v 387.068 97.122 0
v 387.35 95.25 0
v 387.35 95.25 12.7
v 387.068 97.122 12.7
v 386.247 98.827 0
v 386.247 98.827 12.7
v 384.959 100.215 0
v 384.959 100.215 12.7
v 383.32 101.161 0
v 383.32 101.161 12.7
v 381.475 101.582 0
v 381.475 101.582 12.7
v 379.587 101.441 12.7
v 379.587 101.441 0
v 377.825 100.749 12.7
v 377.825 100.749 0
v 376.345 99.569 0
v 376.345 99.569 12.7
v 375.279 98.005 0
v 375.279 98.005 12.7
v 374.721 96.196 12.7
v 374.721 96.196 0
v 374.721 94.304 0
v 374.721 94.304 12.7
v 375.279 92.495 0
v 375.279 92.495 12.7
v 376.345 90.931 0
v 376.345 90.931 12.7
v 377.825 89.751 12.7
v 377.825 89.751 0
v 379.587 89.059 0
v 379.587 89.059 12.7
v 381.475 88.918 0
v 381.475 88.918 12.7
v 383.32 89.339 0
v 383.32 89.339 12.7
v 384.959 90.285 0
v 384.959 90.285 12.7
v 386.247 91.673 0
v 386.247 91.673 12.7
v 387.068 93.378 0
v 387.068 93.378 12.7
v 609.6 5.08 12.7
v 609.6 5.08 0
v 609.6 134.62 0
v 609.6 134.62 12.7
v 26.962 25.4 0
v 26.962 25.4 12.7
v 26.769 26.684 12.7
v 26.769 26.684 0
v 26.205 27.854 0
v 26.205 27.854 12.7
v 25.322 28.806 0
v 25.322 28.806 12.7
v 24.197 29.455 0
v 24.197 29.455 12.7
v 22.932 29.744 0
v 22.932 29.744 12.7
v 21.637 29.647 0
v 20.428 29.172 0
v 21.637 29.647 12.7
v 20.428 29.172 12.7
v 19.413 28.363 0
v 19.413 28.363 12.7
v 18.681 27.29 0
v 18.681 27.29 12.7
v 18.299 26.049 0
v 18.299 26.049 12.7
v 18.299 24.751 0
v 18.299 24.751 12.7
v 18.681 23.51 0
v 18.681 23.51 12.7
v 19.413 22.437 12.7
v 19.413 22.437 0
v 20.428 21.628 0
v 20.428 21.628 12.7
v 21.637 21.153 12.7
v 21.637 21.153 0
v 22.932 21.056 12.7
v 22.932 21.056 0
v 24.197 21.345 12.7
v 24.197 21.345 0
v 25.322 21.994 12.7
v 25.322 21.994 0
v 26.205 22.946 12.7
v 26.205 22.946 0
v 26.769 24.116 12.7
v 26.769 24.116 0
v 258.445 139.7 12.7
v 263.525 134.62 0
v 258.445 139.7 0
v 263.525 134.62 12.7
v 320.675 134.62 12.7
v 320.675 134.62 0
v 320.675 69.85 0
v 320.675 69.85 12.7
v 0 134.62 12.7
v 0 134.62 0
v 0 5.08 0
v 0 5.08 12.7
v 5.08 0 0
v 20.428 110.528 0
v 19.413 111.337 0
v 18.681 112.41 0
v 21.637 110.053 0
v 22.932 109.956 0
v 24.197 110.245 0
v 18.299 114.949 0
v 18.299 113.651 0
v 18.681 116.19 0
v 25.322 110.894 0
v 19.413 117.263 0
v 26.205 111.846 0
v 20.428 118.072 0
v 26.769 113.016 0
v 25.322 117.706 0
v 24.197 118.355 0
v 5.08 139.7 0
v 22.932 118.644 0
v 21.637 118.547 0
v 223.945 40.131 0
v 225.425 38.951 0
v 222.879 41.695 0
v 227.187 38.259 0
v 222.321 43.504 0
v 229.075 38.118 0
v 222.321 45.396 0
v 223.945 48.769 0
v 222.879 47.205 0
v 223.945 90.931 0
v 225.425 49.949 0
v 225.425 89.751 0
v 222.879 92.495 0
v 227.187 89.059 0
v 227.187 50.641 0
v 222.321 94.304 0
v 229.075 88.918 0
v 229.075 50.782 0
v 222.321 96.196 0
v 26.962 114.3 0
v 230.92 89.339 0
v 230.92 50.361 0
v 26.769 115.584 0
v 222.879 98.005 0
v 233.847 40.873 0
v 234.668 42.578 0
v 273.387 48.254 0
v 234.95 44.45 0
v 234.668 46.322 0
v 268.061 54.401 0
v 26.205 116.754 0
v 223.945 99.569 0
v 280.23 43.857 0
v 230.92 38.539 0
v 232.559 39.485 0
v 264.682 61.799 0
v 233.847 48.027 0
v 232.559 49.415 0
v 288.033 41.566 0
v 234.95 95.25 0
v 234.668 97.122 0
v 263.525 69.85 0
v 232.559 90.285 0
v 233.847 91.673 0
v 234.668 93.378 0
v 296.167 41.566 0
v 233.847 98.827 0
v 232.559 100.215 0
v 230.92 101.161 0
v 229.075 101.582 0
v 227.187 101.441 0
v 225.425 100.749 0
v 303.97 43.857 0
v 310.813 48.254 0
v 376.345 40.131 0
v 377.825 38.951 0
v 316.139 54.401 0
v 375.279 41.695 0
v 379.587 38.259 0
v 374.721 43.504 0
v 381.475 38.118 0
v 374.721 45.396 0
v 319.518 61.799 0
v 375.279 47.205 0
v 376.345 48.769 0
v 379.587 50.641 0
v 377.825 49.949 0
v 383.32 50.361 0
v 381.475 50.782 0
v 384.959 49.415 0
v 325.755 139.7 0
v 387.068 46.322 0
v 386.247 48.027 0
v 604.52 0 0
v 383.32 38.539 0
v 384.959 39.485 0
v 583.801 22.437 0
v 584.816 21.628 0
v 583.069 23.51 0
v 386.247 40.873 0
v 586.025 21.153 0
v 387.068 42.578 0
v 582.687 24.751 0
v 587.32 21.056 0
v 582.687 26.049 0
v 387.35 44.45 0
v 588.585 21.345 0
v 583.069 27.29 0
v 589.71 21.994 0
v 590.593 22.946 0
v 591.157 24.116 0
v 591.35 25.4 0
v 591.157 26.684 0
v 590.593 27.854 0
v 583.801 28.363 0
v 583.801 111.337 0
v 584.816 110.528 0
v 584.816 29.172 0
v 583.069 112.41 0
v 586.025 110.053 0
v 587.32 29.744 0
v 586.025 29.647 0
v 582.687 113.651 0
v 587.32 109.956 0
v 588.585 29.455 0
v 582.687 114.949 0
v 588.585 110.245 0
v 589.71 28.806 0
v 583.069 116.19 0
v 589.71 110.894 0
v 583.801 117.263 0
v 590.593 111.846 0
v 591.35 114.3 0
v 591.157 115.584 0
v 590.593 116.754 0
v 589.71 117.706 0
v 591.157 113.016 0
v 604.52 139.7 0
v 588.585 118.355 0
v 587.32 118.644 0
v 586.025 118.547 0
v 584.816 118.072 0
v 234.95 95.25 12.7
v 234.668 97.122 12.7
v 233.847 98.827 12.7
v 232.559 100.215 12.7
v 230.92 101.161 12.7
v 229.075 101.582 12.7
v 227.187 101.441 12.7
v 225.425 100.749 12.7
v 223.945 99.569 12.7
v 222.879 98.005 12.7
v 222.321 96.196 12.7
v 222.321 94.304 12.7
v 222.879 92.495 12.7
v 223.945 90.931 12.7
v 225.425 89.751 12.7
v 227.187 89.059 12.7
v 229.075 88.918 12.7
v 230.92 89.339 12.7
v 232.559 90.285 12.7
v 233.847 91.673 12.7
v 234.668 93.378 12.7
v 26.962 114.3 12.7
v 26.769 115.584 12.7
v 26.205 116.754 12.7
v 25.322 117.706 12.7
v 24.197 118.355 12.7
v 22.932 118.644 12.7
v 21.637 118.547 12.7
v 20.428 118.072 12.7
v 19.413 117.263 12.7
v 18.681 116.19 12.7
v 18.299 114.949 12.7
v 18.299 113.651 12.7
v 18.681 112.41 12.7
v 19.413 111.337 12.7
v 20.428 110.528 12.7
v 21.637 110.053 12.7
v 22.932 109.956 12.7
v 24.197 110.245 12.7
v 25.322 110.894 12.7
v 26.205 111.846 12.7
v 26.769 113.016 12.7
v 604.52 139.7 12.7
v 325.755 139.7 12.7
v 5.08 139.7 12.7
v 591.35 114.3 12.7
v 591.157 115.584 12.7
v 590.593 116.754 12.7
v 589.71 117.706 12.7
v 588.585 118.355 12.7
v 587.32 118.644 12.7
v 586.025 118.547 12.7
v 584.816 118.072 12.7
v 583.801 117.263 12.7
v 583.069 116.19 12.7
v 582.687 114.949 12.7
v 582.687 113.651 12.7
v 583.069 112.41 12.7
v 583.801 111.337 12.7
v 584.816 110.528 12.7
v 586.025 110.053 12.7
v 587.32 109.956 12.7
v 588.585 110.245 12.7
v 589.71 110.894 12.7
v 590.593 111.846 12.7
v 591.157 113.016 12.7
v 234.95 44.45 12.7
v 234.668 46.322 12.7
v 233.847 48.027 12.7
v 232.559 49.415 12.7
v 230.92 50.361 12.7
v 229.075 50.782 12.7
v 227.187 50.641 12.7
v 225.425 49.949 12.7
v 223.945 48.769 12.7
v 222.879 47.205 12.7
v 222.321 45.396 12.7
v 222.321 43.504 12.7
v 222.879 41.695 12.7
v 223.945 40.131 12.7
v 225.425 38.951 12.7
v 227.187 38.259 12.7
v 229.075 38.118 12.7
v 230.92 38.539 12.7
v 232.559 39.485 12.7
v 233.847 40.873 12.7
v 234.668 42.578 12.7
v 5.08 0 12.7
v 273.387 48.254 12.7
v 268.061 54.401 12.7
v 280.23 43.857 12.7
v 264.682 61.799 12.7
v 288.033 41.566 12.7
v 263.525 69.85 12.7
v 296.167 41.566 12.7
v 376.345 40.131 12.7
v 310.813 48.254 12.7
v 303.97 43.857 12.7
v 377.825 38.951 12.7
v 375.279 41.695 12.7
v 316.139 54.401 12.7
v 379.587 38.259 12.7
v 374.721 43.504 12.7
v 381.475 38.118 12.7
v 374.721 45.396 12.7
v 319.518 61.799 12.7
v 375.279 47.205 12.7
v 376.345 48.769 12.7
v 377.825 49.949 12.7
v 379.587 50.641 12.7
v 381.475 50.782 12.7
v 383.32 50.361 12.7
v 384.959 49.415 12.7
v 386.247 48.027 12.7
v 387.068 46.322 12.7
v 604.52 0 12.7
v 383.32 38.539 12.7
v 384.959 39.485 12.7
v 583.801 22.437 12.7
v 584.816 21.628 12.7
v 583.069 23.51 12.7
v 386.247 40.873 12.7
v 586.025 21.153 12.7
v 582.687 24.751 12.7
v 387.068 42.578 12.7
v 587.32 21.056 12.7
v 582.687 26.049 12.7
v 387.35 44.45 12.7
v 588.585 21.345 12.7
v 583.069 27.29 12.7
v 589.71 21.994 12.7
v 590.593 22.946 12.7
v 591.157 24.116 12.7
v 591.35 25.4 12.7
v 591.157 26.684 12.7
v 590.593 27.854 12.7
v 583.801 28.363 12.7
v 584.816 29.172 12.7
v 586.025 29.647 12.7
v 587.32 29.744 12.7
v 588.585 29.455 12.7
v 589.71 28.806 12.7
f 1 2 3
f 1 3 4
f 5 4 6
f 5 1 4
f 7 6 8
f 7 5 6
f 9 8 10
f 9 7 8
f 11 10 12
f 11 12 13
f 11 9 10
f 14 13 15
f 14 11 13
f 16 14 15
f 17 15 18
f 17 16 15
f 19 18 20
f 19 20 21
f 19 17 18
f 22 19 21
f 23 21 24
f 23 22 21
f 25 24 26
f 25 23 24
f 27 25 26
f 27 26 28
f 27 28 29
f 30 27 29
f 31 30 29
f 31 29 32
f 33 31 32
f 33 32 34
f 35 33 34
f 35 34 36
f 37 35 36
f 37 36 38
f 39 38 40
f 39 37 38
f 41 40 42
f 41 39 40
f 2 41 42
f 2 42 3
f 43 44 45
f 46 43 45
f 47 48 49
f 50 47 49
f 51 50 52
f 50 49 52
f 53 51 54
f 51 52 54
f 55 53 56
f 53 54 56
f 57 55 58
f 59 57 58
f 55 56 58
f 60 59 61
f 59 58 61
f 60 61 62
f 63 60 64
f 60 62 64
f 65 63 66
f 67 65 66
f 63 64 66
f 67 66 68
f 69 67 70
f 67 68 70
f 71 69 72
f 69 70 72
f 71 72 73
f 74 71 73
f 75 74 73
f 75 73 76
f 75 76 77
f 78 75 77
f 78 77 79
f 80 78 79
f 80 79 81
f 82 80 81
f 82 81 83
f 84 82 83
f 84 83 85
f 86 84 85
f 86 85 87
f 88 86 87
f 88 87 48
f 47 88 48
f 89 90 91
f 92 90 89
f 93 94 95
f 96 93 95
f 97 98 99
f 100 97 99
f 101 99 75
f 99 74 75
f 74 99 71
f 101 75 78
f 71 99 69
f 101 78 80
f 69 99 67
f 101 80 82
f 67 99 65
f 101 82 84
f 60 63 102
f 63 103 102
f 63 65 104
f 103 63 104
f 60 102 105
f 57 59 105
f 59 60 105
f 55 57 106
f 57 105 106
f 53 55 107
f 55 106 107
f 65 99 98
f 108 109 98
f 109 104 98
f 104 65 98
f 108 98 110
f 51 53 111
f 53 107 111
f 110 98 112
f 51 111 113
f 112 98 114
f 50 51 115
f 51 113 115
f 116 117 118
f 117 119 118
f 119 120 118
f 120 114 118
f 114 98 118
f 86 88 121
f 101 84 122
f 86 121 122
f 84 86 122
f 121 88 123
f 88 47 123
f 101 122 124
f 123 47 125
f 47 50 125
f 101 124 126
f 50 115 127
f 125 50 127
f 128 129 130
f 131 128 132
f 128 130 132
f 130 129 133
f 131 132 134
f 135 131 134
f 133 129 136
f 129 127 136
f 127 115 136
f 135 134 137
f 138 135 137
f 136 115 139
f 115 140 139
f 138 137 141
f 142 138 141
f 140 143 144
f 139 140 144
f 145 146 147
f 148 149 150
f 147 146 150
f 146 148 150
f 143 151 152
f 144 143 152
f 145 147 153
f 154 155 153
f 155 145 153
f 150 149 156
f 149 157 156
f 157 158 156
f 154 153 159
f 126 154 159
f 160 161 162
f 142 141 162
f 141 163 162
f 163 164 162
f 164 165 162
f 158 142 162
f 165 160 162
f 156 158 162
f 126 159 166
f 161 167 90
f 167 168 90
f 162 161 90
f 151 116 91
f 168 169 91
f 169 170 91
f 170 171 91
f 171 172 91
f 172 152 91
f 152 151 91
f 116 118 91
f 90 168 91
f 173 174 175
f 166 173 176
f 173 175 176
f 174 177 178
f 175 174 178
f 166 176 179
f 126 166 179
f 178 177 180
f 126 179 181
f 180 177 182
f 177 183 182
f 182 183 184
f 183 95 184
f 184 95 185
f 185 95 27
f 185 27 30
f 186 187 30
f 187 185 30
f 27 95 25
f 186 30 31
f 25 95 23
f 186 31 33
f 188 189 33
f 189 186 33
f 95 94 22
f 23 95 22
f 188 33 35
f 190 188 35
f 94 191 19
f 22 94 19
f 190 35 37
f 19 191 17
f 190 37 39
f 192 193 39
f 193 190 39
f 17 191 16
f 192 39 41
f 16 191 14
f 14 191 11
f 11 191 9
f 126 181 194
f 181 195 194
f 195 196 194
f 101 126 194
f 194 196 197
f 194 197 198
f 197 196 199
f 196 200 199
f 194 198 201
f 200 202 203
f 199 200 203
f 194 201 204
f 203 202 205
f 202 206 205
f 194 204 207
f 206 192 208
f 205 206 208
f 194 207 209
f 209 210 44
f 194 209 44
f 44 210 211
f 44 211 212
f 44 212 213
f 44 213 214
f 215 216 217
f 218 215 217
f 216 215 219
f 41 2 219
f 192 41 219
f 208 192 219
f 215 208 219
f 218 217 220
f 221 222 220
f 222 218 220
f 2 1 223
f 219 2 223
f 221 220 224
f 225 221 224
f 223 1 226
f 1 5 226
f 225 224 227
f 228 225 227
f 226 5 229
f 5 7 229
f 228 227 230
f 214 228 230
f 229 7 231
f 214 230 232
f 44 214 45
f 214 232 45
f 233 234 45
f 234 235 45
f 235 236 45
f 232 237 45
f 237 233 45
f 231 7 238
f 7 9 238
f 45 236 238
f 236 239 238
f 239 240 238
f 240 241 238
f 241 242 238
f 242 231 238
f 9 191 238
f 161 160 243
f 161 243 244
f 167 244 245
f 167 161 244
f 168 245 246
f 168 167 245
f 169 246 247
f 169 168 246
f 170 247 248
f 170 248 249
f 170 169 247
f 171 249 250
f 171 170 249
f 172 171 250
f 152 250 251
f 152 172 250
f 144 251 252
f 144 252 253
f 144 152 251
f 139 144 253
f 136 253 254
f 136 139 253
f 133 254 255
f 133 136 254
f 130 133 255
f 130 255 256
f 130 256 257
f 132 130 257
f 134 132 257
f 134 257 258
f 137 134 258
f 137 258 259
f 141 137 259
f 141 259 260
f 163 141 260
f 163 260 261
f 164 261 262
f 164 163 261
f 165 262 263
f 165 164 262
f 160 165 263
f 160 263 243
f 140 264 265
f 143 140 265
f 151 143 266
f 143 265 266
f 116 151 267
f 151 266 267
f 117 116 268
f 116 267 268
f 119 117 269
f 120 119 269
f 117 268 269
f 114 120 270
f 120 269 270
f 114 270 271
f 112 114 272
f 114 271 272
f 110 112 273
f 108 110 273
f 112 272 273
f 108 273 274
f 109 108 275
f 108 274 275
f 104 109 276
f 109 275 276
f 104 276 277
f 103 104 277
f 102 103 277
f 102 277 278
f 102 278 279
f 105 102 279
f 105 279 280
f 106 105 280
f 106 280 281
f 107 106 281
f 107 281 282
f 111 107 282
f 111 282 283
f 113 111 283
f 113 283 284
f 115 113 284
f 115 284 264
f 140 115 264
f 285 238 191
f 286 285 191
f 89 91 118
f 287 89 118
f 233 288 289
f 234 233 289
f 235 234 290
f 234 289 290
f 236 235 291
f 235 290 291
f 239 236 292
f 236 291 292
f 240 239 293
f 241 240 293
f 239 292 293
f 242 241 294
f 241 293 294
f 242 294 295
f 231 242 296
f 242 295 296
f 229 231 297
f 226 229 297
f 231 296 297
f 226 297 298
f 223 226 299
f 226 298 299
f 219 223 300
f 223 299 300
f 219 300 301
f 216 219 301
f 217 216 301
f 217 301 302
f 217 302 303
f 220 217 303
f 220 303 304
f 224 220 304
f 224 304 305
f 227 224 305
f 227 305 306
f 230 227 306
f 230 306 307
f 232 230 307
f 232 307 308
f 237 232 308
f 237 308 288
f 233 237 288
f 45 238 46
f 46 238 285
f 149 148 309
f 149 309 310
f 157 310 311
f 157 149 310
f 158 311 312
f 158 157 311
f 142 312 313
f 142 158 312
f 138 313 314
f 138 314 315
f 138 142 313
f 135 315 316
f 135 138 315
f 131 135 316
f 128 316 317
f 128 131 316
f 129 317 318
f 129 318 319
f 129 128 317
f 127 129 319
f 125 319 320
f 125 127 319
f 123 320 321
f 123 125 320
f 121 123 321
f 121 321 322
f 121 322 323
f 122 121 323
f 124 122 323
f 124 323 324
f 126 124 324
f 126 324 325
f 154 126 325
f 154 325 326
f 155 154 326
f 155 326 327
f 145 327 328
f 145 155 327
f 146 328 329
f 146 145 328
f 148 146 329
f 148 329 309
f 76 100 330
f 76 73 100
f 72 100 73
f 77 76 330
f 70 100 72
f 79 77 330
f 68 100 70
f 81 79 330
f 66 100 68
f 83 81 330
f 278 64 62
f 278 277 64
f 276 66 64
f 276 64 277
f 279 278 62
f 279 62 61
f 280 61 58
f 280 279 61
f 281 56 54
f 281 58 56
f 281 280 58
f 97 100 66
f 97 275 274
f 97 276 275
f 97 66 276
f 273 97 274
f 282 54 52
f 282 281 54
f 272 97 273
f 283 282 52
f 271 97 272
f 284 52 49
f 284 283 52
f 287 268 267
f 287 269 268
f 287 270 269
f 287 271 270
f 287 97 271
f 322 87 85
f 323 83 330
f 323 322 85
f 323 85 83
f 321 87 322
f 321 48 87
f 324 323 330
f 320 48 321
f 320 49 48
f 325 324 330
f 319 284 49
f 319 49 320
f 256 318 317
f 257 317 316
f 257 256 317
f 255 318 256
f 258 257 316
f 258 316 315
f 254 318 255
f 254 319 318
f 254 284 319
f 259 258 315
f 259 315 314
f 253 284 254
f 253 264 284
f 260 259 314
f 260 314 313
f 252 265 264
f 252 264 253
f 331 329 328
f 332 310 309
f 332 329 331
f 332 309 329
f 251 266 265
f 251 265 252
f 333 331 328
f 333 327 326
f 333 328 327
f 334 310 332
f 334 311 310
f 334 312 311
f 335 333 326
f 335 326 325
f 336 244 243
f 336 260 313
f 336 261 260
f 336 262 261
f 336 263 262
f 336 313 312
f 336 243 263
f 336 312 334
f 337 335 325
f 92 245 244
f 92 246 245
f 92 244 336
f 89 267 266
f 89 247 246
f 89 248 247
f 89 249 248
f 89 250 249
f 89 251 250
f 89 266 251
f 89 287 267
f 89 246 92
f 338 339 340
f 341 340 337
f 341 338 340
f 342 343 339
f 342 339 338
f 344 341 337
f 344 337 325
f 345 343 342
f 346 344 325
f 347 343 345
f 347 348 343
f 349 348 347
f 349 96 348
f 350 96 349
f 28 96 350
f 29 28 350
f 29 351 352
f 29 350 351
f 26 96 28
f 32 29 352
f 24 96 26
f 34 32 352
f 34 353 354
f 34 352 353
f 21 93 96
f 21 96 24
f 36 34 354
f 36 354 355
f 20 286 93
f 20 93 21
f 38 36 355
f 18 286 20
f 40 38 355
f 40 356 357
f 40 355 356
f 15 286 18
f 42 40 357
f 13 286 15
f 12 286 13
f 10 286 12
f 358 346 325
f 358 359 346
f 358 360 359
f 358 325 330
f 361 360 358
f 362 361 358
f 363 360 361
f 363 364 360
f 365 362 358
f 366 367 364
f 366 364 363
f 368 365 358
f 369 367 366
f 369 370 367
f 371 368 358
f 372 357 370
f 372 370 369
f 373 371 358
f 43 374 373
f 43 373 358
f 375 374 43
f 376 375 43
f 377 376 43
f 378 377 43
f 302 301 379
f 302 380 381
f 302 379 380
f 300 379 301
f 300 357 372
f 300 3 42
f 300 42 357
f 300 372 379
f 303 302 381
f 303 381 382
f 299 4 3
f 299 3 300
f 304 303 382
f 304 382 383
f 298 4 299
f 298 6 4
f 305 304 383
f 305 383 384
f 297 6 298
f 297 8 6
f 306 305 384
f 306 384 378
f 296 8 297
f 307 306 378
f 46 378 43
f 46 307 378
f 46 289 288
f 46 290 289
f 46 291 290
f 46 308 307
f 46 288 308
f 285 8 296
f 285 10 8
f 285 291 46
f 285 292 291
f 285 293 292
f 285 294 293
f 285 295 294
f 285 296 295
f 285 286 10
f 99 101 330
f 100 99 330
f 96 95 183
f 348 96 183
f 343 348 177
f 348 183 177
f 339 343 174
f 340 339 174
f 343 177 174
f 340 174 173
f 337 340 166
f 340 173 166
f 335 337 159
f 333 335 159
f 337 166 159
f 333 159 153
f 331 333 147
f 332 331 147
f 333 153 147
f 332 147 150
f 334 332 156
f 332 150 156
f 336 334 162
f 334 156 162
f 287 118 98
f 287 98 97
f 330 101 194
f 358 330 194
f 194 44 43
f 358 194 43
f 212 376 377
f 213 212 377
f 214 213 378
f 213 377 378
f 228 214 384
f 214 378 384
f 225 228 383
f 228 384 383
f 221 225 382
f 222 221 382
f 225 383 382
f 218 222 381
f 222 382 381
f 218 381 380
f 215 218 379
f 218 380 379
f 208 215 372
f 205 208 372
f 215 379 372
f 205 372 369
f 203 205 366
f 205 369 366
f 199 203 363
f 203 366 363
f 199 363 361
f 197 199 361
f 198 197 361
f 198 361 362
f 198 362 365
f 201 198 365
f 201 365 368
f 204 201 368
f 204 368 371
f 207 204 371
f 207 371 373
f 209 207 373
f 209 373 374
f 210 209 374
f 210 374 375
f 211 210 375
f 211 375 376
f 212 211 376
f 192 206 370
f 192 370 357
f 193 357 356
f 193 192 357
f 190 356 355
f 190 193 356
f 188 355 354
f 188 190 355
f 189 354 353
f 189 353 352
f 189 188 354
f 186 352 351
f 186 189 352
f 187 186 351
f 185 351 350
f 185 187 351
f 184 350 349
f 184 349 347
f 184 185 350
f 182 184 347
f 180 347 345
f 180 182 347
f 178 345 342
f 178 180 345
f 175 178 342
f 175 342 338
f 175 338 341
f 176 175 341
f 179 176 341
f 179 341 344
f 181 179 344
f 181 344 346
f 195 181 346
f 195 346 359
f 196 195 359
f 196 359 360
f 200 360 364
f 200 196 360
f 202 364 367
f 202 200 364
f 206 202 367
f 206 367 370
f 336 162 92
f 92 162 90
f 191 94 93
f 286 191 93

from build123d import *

# Parameters (mm, degrees)
F0_R     = 6.35
F1_DEPTH = 12.7
F2_SIZE  = 5.08
F3_R     = 4.3561
F4_DEPTH = 12.701


with BuildPart() as f1:
    # F0 (on Top) → F1 (new body)
    with BuildSketch(Plane.XY):
        with BuildLine():
            Line((0, 139.7), (0, 0))
            Line((0, 0), (609.6, 0))
            Line((609.6, 0), (609.6, 139.7))
            Line((609.6, 139.7), (333.375, 139.7))
            Line((333.375, 139.7), (320.675, 139.7))
            Line((320.675, 139.7), (320.675, 69.85))
            ThreePointArc((320.675, 69.85), (292.1, 41.275), (263.525, 69.85))
            Line((263.525, 69.85), (263.525, 139.7))
            Line((263.525, 139.7), (0, 139.7))
        make_face()
        with Locations((228.6, 44.45)):
            Circle(F0_R, mode=Mode.SUBTRACT)
        with Locations((381, 44.45)):
            Circle(F0_R, mode=Mode.SUBTRACT)
        with Locations((228.6, 95.25)):
            Circle(F0_R, mode=Mode.SUBTRACT)
        with Locations((381, 95.25)):
            Circle(F0_R, mode=Mode.SUBTRACT)
    extrude(amount=F1_DEPTH)

    # F2
    f2_edges = [f1.edges().sort_by_distance(p)[0] for p in [
        (320.675, 139.7, 6.35),
        (0, 0, 6.35),
        (0, 139.7, 6.35),
        (263.525, 139.7, 6.35),
        (609.6, 139.7, 6.35),
        (609.6, 0, 6.35),
    ]]
    chamfer(f2_edges, length=F2_SIZE)

    # F3 (on face) → F4 (cut, through all)
    with BuildSketch(Plane.XY.offset(12.7)):
        with Locations((22.606, 114.3)):
            Circle(F3_R)
        with Locations((22.606, 25.4)):
            Circle(F3_R)
        with Locations((586.994, 25.4)):
            Circle(F3_R)
        with Locations((586.994, 114.3)):
            Circle(F3_R)
    extrude(amount=-F4_DEPTH, mode=Mode.SUBTRACT)


solid = f1.part
